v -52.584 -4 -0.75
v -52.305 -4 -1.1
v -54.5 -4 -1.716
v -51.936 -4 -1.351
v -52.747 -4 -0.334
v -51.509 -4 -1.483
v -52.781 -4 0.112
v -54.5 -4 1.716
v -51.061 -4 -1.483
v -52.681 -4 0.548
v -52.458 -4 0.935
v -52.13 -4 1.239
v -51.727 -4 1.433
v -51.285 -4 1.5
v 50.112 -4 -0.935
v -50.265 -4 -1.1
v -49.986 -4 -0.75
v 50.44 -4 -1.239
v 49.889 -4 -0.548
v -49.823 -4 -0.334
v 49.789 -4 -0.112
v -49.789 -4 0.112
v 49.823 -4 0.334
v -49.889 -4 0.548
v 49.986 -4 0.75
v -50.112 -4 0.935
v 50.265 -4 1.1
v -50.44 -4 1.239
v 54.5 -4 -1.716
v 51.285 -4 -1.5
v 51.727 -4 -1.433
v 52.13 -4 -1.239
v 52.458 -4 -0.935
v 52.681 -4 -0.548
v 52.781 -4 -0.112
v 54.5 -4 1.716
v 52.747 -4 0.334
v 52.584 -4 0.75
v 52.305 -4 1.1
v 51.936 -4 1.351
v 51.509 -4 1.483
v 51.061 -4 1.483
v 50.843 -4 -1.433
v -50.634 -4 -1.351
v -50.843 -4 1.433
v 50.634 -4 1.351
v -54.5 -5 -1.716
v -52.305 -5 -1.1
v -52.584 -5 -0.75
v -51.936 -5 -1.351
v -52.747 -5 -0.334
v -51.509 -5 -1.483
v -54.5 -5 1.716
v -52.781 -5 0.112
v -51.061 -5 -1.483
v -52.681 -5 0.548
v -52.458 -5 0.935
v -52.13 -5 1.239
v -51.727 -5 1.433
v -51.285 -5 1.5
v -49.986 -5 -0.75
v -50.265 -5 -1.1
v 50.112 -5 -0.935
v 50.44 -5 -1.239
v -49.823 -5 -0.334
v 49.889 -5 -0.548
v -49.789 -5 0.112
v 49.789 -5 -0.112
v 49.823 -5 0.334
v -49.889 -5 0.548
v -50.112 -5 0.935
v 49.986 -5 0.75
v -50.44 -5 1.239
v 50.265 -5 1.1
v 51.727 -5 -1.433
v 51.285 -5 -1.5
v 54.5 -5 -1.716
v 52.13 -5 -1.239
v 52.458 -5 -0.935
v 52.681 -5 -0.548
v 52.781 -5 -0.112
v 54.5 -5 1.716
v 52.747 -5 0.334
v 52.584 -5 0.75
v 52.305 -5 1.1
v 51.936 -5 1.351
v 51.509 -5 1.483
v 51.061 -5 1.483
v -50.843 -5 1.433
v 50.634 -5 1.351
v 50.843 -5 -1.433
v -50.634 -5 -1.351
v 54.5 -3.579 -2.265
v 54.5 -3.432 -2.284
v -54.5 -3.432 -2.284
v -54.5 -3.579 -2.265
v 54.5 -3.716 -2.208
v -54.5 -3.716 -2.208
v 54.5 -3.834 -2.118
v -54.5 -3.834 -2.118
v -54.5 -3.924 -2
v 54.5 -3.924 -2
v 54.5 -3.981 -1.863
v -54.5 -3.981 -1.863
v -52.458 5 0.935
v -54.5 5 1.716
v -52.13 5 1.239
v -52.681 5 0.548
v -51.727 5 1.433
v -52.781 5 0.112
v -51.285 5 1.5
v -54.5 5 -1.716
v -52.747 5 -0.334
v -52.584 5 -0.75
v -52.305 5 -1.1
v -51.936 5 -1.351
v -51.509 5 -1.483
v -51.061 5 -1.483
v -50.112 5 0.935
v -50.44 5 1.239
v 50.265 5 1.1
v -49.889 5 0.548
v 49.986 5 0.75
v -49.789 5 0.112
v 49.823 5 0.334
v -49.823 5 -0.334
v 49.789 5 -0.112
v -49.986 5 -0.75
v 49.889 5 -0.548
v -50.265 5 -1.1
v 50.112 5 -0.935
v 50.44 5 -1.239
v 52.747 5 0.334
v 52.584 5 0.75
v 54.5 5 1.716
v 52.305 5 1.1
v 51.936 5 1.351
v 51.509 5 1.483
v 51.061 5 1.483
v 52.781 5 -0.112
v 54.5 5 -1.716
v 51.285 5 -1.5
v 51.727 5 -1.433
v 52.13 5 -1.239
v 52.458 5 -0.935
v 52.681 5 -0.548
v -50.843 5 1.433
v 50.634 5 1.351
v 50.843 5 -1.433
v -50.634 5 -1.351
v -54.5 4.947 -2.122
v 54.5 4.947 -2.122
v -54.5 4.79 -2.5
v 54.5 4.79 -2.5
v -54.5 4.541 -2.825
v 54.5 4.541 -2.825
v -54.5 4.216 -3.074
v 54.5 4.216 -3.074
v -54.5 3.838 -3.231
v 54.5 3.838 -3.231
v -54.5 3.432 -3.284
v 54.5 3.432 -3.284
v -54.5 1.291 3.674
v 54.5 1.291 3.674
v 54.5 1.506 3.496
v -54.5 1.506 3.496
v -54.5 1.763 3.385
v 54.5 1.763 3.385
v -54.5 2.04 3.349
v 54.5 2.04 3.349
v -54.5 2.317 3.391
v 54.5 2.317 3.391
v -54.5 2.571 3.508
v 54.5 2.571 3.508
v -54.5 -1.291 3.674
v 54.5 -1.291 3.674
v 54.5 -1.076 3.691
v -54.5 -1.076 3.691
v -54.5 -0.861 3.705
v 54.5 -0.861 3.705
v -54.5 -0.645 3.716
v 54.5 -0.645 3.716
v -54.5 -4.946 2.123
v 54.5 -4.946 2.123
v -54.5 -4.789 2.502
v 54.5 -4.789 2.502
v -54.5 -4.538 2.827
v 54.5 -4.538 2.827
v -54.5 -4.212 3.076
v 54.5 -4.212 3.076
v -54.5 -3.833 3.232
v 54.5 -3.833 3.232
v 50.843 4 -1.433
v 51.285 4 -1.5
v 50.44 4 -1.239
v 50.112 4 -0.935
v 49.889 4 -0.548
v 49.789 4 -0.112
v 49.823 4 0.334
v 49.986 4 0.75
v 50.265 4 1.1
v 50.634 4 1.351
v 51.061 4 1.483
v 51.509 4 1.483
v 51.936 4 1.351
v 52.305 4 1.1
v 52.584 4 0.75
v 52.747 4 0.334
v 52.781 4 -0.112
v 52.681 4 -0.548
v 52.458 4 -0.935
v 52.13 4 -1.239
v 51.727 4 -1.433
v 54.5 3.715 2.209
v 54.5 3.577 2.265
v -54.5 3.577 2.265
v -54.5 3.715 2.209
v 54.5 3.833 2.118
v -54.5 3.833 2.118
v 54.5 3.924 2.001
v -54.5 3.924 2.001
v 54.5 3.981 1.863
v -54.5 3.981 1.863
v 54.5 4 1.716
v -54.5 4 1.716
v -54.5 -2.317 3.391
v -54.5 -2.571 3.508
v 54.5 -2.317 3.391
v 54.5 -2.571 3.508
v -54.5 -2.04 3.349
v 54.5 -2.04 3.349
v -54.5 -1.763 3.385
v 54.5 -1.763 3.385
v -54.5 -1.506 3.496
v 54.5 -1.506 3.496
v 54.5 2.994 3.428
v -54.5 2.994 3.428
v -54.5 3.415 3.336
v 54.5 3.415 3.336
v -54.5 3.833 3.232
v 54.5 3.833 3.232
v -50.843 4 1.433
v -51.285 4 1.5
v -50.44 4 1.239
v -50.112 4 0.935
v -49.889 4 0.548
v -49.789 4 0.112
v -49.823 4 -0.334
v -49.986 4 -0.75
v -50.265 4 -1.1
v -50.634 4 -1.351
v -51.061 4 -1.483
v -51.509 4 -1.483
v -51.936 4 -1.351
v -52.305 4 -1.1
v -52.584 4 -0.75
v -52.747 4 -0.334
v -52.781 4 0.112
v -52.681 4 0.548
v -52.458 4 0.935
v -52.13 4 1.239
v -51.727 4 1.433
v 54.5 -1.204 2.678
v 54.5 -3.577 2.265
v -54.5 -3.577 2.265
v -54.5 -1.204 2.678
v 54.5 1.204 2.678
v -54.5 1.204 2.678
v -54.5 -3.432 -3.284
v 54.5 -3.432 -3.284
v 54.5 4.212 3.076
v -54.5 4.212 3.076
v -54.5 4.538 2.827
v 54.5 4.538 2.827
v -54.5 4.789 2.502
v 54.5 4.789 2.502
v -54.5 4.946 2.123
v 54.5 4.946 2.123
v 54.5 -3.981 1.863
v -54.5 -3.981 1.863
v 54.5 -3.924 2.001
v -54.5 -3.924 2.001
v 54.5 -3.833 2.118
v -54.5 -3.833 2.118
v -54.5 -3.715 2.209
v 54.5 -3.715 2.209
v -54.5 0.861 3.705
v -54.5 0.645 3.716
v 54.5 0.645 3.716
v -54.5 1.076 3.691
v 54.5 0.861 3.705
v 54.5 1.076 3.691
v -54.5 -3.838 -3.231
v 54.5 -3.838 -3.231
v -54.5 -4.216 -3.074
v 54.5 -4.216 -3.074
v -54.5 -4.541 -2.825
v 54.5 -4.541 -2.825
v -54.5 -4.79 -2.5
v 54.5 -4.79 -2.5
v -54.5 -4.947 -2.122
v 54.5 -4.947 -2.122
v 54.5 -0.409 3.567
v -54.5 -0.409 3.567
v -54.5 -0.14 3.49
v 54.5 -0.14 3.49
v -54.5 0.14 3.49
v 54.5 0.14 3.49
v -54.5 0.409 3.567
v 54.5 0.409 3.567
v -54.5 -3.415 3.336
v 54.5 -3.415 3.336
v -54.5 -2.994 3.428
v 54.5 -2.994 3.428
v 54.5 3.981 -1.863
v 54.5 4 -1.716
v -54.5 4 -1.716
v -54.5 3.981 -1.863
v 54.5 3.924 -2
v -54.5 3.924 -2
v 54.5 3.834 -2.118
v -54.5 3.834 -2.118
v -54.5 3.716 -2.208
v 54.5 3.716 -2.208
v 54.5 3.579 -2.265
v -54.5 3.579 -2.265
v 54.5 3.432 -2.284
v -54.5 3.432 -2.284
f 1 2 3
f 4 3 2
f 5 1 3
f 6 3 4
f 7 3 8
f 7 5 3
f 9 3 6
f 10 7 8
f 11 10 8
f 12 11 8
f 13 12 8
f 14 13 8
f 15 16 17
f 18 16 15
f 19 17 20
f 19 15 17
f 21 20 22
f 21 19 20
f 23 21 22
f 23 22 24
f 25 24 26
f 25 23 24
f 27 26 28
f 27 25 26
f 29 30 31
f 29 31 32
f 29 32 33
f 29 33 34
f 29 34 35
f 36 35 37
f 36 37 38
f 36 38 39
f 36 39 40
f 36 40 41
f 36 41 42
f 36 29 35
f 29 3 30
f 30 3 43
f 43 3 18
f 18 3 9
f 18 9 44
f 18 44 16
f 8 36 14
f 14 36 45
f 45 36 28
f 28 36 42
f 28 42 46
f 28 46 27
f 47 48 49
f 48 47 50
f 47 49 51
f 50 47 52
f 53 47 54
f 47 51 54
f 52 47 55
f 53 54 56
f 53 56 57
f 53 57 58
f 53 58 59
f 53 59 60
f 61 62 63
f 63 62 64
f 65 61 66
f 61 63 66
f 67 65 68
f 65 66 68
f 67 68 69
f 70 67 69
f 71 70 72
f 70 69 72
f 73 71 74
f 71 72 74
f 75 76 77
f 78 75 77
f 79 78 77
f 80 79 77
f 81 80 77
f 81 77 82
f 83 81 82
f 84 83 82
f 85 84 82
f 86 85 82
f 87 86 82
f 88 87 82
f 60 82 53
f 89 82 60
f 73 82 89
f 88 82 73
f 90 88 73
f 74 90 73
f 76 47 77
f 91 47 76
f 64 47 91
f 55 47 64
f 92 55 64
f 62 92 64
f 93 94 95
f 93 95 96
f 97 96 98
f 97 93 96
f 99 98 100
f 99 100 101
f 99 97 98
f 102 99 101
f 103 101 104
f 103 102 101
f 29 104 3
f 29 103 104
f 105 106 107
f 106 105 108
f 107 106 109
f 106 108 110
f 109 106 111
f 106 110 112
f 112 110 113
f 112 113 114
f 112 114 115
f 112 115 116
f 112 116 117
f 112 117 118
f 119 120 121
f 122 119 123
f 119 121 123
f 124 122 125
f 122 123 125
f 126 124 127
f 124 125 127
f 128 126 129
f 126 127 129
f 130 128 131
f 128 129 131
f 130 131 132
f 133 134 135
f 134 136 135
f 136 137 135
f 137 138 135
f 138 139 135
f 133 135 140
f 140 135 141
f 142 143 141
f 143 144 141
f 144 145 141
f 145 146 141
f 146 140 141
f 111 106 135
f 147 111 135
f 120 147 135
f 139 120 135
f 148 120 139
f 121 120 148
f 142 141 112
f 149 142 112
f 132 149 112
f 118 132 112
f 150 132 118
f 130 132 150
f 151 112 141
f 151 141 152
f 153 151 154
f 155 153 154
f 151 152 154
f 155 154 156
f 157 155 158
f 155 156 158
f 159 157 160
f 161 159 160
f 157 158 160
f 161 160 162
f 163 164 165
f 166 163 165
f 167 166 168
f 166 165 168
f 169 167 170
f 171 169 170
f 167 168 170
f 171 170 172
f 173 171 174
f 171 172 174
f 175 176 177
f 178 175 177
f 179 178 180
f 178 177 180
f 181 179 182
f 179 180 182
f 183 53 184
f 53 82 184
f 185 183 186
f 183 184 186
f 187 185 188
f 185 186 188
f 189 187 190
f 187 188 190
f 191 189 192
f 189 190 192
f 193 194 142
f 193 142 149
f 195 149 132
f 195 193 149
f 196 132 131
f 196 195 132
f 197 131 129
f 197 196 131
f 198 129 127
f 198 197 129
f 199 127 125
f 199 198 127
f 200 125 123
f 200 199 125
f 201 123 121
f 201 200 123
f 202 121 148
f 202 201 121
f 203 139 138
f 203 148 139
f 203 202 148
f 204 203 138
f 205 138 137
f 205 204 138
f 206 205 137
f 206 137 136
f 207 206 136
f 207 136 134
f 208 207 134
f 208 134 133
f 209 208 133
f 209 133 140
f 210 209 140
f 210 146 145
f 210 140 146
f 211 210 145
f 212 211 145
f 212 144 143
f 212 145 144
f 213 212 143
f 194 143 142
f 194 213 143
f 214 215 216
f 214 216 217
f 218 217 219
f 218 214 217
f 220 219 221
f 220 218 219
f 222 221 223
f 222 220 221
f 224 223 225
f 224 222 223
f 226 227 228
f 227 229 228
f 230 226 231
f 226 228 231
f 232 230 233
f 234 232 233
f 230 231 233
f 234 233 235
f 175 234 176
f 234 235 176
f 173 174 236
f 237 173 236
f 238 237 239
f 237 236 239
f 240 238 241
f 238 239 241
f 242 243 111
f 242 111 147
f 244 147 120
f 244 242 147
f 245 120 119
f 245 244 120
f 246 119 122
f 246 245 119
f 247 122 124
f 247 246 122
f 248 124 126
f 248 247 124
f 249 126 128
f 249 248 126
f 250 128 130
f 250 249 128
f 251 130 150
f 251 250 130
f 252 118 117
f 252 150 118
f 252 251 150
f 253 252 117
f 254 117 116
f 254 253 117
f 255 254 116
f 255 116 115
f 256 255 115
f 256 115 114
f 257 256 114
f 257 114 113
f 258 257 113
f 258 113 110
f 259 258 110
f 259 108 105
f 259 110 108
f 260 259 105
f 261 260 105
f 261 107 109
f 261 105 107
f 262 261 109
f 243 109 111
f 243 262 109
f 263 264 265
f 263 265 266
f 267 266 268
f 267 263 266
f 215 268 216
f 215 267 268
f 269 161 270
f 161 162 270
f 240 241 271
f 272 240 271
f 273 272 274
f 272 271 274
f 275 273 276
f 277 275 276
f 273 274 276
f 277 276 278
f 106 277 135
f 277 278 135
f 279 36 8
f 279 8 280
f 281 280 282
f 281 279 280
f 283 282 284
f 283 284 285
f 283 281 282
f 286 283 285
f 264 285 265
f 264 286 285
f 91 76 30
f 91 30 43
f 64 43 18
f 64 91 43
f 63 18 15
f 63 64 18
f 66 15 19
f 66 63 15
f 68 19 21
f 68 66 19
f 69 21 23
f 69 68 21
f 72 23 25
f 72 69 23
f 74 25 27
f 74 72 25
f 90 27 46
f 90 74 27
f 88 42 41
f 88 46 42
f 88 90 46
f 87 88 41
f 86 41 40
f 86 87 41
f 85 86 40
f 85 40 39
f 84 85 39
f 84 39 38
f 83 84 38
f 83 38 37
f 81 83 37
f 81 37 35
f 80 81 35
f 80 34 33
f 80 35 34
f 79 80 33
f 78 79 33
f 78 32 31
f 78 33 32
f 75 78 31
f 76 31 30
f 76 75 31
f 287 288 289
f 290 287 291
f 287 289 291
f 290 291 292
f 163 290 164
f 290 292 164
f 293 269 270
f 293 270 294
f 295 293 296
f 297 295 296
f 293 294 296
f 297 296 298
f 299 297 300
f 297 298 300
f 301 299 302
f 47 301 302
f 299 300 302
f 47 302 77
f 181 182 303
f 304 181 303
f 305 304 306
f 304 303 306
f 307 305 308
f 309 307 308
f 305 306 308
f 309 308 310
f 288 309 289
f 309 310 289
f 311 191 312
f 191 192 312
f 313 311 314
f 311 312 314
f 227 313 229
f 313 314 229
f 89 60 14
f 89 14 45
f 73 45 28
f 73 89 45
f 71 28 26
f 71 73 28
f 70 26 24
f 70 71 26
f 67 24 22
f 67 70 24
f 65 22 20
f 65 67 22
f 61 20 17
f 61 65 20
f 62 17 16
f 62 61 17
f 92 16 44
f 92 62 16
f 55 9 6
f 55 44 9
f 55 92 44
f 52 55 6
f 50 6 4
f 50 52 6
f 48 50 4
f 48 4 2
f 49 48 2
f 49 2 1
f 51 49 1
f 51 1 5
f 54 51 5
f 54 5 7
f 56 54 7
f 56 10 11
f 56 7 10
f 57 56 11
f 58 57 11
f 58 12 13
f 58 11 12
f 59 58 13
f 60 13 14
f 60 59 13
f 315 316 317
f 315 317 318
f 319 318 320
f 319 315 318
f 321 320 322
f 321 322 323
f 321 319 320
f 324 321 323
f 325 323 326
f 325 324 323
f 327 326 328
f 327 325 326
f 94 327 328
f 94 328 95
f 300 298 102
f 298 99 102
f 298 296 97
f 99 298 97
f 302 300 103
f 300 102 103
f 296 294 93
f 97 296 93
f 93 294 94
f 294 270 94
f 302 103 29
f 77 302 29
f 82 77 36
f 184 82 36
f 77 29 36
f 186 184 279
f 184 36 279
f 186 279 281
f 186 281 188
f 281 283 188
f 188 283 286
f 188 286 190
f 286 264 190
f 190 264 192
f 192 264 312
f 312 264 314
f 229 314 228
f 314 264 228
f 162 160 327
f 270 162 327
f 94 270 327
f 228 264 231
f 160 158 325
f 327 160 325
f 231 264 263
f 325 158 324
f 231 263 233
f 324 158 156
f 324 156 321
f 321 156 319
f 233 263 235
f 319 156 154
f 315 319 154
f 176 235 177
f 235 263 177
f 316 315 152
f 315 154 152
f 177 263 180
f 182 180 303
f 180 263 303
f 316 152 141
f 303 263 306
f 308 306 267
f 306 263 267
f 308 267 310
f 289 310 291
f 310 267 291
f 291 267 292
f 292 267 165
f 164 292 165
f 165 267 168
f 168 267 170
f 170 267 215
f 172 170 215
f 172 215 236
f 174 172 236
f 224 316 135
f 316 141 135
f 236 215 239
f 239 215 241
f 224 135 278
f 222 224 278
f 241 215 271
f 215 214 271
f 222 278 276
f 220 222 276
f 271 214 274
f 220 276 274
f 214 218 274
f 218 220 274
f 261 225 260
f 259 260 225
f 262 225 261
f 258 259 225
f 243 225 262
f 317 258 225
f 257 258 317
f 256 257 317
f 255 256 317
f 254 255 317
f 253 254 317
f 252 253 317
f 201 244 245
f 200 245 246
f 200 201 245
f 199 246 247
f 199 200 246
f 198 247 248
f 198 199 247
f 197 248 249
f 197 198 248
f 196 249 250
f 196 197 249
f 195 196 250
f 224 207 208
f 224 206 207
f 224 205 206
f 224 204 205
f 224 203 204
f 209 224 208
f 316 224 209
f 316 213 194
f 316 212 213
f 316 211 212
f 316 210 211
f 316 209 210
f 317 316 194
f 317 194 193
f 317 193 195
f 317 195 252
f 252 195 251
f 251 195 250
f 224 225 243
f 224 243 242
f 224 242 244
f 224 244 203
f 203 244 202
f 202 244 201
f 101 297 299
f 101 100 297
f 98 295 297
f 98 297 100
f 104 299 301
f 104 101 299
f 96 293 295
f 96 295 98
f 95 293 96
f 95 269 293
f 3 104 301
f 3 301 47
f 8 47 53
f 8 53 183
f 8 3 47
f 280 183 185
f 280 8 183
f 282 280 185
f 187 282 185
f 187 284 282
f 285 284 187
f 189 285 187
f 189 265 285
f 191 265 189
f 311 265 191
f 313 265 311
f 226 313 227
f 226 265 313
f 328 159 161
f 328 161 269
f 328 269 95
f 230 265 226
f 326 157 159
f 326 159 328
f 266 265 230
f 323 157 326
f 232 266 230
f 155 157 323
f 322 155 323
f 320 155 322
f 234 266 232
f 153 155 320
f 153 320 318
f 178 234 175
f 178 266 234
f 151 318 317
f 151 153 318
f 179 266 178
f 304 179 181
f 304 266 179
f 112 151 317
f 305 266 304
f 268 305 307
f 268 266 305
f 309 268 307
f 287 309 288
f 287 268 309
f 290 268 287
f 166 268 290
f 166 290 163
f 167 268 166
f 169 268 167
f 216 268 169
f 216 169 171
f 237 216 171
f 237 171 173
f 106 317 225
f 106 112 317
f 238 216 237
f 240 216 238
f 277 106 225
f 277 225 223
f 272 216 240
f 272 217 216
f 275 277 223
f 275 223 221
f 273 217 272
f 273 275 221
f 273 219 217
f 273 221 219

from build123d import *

# Parameters (mm, degrees)
EXTRUDE1_DEPTH          = 54.5
CUT_EXTRUDE1_DEPTH      = 55.854885702
CUT_EXTRUDE1_DEPTH_BACK = 55.854885702
SKETCH2_R               = 1.5


with BuildPart() as part:
    # Sketch1 → Extrude1 (new, symmetric)
    with BuildSketch(Plane(origin=(0, 0, 0), x_dir=(0, 0, -1), z_dir=(1, 0, 0))):
        with BuildLine():
            Line((-1.715977045, 5), (1.715977045, 5))
            ThreePointArc((1.715977045, 5), (2.824752941, 4.540729986), (3.284022955, 3.43195409))
            Line((3.284022955, 3.43195409), (3.284022955, -3.43195409))
            ThreePointArc((3.284022955, -3.43195409), (2.824752941, -4.540729986), (1.715977045, -5))
            Line((1.715977045, -5), (-1.715977045, -5))
            ThreePointArc((-1.715977045, -5), (-2.672673527, -4.674330771), (-3.23197526, -3.832600305))
            ThreePointArc((-3.23197526, -3.832600305), (-3.383560587, -3.204564402), (-3.507961213, -2.570583572))
            ThreePointArc((-3.507961213, -2.570583572), (-3.356955711, -1.900195953), (-3.674237451, -1.290643232))
            ThreePointArc((-3.674237451, -1.290643232), (-3.698584955, -0.968220458), (-3.715977045, -0.645347786))
            ThreePointArc((-3.715977045, -0.645347786), (-3.479865934, 0), (-3.715977045, 0.645347786))
            ThreePointArc((-3.715977045, 0.645347786), (-3.698584955, 0.968220458), (-3.674237451, 1.290643232))
            ThreePointArc((-3.674237451, 1.290643232), (-3.356955711, 1.900195953), (-3.507961213, 2.570583572))
            ThreePointArc((-3.507961213, 2.570583572), (-3.383560587, 3.204564402), (-3.23197526, 3.832600305))
            ThreePointArc((-3.23197526, 3.832600305), (-2.672673527, 4.674330771), (-1.715977045, 5))
        make_face()
        with BuildLine():
            Line((-1.715977045, 4), (1.715977045, 4))
            ThreePointArc((1.715977045, 4), (2.11764616, 3.833623205), (2.284022955, 3.43195409))
            Line((2.284022955, 3.43195409), (2.284022955, -3.43195409))
            ThreePointArc((2.284022955, -3.43195409), (2.11764616, -3.833623205), (1.715977045, -4))
            Line((1.715977045, -4), (-1.715977045, -4))
            ThreePointArc((-1.715977045, -4), (-2.062553328, -3.882021902), (-2.265167971, -3.577093618))
            ThreePointArc((-2.265167971, -3.577093618), (-2.729865934, 0), (-2.265167971, 3.577093618))
            ThreePointArc((-2.265167971, 3.577093618), (-2.062553328, 3.882021902), (-1.715977045, 4))
        make_face(mode=Mode.SUBTRACT)
    extrude(amount=EXTRUDE1_DEPTH, both=True)

    # Sketch2 → Cut-Extrude1 (cut, two sides: drawn at the far end of the back side and taken through both)
    with BuildSketch(Plane(origin=(0, 0, 0), x_dir=(1, 0, 0), z_dir=(0, 1, 0)).offset(-CUT_EXTRUDE1_DEPTH_BACK)):
        with Locations(Location((-51.285, 0, 0), (0, 0, 270))):
            Circle(SKETCH2_R)
        with Locations(Location((51.285, 0, 0), (0, 0, 90))):
            Circle(SKETCH2_R)
    extrude(amount=CUT_EXTRUDE1_DEPTH + CUT_EXTRUDE1_DEPTH_BACK, mode=Mode.SUBTRACT)


solid = part.part
